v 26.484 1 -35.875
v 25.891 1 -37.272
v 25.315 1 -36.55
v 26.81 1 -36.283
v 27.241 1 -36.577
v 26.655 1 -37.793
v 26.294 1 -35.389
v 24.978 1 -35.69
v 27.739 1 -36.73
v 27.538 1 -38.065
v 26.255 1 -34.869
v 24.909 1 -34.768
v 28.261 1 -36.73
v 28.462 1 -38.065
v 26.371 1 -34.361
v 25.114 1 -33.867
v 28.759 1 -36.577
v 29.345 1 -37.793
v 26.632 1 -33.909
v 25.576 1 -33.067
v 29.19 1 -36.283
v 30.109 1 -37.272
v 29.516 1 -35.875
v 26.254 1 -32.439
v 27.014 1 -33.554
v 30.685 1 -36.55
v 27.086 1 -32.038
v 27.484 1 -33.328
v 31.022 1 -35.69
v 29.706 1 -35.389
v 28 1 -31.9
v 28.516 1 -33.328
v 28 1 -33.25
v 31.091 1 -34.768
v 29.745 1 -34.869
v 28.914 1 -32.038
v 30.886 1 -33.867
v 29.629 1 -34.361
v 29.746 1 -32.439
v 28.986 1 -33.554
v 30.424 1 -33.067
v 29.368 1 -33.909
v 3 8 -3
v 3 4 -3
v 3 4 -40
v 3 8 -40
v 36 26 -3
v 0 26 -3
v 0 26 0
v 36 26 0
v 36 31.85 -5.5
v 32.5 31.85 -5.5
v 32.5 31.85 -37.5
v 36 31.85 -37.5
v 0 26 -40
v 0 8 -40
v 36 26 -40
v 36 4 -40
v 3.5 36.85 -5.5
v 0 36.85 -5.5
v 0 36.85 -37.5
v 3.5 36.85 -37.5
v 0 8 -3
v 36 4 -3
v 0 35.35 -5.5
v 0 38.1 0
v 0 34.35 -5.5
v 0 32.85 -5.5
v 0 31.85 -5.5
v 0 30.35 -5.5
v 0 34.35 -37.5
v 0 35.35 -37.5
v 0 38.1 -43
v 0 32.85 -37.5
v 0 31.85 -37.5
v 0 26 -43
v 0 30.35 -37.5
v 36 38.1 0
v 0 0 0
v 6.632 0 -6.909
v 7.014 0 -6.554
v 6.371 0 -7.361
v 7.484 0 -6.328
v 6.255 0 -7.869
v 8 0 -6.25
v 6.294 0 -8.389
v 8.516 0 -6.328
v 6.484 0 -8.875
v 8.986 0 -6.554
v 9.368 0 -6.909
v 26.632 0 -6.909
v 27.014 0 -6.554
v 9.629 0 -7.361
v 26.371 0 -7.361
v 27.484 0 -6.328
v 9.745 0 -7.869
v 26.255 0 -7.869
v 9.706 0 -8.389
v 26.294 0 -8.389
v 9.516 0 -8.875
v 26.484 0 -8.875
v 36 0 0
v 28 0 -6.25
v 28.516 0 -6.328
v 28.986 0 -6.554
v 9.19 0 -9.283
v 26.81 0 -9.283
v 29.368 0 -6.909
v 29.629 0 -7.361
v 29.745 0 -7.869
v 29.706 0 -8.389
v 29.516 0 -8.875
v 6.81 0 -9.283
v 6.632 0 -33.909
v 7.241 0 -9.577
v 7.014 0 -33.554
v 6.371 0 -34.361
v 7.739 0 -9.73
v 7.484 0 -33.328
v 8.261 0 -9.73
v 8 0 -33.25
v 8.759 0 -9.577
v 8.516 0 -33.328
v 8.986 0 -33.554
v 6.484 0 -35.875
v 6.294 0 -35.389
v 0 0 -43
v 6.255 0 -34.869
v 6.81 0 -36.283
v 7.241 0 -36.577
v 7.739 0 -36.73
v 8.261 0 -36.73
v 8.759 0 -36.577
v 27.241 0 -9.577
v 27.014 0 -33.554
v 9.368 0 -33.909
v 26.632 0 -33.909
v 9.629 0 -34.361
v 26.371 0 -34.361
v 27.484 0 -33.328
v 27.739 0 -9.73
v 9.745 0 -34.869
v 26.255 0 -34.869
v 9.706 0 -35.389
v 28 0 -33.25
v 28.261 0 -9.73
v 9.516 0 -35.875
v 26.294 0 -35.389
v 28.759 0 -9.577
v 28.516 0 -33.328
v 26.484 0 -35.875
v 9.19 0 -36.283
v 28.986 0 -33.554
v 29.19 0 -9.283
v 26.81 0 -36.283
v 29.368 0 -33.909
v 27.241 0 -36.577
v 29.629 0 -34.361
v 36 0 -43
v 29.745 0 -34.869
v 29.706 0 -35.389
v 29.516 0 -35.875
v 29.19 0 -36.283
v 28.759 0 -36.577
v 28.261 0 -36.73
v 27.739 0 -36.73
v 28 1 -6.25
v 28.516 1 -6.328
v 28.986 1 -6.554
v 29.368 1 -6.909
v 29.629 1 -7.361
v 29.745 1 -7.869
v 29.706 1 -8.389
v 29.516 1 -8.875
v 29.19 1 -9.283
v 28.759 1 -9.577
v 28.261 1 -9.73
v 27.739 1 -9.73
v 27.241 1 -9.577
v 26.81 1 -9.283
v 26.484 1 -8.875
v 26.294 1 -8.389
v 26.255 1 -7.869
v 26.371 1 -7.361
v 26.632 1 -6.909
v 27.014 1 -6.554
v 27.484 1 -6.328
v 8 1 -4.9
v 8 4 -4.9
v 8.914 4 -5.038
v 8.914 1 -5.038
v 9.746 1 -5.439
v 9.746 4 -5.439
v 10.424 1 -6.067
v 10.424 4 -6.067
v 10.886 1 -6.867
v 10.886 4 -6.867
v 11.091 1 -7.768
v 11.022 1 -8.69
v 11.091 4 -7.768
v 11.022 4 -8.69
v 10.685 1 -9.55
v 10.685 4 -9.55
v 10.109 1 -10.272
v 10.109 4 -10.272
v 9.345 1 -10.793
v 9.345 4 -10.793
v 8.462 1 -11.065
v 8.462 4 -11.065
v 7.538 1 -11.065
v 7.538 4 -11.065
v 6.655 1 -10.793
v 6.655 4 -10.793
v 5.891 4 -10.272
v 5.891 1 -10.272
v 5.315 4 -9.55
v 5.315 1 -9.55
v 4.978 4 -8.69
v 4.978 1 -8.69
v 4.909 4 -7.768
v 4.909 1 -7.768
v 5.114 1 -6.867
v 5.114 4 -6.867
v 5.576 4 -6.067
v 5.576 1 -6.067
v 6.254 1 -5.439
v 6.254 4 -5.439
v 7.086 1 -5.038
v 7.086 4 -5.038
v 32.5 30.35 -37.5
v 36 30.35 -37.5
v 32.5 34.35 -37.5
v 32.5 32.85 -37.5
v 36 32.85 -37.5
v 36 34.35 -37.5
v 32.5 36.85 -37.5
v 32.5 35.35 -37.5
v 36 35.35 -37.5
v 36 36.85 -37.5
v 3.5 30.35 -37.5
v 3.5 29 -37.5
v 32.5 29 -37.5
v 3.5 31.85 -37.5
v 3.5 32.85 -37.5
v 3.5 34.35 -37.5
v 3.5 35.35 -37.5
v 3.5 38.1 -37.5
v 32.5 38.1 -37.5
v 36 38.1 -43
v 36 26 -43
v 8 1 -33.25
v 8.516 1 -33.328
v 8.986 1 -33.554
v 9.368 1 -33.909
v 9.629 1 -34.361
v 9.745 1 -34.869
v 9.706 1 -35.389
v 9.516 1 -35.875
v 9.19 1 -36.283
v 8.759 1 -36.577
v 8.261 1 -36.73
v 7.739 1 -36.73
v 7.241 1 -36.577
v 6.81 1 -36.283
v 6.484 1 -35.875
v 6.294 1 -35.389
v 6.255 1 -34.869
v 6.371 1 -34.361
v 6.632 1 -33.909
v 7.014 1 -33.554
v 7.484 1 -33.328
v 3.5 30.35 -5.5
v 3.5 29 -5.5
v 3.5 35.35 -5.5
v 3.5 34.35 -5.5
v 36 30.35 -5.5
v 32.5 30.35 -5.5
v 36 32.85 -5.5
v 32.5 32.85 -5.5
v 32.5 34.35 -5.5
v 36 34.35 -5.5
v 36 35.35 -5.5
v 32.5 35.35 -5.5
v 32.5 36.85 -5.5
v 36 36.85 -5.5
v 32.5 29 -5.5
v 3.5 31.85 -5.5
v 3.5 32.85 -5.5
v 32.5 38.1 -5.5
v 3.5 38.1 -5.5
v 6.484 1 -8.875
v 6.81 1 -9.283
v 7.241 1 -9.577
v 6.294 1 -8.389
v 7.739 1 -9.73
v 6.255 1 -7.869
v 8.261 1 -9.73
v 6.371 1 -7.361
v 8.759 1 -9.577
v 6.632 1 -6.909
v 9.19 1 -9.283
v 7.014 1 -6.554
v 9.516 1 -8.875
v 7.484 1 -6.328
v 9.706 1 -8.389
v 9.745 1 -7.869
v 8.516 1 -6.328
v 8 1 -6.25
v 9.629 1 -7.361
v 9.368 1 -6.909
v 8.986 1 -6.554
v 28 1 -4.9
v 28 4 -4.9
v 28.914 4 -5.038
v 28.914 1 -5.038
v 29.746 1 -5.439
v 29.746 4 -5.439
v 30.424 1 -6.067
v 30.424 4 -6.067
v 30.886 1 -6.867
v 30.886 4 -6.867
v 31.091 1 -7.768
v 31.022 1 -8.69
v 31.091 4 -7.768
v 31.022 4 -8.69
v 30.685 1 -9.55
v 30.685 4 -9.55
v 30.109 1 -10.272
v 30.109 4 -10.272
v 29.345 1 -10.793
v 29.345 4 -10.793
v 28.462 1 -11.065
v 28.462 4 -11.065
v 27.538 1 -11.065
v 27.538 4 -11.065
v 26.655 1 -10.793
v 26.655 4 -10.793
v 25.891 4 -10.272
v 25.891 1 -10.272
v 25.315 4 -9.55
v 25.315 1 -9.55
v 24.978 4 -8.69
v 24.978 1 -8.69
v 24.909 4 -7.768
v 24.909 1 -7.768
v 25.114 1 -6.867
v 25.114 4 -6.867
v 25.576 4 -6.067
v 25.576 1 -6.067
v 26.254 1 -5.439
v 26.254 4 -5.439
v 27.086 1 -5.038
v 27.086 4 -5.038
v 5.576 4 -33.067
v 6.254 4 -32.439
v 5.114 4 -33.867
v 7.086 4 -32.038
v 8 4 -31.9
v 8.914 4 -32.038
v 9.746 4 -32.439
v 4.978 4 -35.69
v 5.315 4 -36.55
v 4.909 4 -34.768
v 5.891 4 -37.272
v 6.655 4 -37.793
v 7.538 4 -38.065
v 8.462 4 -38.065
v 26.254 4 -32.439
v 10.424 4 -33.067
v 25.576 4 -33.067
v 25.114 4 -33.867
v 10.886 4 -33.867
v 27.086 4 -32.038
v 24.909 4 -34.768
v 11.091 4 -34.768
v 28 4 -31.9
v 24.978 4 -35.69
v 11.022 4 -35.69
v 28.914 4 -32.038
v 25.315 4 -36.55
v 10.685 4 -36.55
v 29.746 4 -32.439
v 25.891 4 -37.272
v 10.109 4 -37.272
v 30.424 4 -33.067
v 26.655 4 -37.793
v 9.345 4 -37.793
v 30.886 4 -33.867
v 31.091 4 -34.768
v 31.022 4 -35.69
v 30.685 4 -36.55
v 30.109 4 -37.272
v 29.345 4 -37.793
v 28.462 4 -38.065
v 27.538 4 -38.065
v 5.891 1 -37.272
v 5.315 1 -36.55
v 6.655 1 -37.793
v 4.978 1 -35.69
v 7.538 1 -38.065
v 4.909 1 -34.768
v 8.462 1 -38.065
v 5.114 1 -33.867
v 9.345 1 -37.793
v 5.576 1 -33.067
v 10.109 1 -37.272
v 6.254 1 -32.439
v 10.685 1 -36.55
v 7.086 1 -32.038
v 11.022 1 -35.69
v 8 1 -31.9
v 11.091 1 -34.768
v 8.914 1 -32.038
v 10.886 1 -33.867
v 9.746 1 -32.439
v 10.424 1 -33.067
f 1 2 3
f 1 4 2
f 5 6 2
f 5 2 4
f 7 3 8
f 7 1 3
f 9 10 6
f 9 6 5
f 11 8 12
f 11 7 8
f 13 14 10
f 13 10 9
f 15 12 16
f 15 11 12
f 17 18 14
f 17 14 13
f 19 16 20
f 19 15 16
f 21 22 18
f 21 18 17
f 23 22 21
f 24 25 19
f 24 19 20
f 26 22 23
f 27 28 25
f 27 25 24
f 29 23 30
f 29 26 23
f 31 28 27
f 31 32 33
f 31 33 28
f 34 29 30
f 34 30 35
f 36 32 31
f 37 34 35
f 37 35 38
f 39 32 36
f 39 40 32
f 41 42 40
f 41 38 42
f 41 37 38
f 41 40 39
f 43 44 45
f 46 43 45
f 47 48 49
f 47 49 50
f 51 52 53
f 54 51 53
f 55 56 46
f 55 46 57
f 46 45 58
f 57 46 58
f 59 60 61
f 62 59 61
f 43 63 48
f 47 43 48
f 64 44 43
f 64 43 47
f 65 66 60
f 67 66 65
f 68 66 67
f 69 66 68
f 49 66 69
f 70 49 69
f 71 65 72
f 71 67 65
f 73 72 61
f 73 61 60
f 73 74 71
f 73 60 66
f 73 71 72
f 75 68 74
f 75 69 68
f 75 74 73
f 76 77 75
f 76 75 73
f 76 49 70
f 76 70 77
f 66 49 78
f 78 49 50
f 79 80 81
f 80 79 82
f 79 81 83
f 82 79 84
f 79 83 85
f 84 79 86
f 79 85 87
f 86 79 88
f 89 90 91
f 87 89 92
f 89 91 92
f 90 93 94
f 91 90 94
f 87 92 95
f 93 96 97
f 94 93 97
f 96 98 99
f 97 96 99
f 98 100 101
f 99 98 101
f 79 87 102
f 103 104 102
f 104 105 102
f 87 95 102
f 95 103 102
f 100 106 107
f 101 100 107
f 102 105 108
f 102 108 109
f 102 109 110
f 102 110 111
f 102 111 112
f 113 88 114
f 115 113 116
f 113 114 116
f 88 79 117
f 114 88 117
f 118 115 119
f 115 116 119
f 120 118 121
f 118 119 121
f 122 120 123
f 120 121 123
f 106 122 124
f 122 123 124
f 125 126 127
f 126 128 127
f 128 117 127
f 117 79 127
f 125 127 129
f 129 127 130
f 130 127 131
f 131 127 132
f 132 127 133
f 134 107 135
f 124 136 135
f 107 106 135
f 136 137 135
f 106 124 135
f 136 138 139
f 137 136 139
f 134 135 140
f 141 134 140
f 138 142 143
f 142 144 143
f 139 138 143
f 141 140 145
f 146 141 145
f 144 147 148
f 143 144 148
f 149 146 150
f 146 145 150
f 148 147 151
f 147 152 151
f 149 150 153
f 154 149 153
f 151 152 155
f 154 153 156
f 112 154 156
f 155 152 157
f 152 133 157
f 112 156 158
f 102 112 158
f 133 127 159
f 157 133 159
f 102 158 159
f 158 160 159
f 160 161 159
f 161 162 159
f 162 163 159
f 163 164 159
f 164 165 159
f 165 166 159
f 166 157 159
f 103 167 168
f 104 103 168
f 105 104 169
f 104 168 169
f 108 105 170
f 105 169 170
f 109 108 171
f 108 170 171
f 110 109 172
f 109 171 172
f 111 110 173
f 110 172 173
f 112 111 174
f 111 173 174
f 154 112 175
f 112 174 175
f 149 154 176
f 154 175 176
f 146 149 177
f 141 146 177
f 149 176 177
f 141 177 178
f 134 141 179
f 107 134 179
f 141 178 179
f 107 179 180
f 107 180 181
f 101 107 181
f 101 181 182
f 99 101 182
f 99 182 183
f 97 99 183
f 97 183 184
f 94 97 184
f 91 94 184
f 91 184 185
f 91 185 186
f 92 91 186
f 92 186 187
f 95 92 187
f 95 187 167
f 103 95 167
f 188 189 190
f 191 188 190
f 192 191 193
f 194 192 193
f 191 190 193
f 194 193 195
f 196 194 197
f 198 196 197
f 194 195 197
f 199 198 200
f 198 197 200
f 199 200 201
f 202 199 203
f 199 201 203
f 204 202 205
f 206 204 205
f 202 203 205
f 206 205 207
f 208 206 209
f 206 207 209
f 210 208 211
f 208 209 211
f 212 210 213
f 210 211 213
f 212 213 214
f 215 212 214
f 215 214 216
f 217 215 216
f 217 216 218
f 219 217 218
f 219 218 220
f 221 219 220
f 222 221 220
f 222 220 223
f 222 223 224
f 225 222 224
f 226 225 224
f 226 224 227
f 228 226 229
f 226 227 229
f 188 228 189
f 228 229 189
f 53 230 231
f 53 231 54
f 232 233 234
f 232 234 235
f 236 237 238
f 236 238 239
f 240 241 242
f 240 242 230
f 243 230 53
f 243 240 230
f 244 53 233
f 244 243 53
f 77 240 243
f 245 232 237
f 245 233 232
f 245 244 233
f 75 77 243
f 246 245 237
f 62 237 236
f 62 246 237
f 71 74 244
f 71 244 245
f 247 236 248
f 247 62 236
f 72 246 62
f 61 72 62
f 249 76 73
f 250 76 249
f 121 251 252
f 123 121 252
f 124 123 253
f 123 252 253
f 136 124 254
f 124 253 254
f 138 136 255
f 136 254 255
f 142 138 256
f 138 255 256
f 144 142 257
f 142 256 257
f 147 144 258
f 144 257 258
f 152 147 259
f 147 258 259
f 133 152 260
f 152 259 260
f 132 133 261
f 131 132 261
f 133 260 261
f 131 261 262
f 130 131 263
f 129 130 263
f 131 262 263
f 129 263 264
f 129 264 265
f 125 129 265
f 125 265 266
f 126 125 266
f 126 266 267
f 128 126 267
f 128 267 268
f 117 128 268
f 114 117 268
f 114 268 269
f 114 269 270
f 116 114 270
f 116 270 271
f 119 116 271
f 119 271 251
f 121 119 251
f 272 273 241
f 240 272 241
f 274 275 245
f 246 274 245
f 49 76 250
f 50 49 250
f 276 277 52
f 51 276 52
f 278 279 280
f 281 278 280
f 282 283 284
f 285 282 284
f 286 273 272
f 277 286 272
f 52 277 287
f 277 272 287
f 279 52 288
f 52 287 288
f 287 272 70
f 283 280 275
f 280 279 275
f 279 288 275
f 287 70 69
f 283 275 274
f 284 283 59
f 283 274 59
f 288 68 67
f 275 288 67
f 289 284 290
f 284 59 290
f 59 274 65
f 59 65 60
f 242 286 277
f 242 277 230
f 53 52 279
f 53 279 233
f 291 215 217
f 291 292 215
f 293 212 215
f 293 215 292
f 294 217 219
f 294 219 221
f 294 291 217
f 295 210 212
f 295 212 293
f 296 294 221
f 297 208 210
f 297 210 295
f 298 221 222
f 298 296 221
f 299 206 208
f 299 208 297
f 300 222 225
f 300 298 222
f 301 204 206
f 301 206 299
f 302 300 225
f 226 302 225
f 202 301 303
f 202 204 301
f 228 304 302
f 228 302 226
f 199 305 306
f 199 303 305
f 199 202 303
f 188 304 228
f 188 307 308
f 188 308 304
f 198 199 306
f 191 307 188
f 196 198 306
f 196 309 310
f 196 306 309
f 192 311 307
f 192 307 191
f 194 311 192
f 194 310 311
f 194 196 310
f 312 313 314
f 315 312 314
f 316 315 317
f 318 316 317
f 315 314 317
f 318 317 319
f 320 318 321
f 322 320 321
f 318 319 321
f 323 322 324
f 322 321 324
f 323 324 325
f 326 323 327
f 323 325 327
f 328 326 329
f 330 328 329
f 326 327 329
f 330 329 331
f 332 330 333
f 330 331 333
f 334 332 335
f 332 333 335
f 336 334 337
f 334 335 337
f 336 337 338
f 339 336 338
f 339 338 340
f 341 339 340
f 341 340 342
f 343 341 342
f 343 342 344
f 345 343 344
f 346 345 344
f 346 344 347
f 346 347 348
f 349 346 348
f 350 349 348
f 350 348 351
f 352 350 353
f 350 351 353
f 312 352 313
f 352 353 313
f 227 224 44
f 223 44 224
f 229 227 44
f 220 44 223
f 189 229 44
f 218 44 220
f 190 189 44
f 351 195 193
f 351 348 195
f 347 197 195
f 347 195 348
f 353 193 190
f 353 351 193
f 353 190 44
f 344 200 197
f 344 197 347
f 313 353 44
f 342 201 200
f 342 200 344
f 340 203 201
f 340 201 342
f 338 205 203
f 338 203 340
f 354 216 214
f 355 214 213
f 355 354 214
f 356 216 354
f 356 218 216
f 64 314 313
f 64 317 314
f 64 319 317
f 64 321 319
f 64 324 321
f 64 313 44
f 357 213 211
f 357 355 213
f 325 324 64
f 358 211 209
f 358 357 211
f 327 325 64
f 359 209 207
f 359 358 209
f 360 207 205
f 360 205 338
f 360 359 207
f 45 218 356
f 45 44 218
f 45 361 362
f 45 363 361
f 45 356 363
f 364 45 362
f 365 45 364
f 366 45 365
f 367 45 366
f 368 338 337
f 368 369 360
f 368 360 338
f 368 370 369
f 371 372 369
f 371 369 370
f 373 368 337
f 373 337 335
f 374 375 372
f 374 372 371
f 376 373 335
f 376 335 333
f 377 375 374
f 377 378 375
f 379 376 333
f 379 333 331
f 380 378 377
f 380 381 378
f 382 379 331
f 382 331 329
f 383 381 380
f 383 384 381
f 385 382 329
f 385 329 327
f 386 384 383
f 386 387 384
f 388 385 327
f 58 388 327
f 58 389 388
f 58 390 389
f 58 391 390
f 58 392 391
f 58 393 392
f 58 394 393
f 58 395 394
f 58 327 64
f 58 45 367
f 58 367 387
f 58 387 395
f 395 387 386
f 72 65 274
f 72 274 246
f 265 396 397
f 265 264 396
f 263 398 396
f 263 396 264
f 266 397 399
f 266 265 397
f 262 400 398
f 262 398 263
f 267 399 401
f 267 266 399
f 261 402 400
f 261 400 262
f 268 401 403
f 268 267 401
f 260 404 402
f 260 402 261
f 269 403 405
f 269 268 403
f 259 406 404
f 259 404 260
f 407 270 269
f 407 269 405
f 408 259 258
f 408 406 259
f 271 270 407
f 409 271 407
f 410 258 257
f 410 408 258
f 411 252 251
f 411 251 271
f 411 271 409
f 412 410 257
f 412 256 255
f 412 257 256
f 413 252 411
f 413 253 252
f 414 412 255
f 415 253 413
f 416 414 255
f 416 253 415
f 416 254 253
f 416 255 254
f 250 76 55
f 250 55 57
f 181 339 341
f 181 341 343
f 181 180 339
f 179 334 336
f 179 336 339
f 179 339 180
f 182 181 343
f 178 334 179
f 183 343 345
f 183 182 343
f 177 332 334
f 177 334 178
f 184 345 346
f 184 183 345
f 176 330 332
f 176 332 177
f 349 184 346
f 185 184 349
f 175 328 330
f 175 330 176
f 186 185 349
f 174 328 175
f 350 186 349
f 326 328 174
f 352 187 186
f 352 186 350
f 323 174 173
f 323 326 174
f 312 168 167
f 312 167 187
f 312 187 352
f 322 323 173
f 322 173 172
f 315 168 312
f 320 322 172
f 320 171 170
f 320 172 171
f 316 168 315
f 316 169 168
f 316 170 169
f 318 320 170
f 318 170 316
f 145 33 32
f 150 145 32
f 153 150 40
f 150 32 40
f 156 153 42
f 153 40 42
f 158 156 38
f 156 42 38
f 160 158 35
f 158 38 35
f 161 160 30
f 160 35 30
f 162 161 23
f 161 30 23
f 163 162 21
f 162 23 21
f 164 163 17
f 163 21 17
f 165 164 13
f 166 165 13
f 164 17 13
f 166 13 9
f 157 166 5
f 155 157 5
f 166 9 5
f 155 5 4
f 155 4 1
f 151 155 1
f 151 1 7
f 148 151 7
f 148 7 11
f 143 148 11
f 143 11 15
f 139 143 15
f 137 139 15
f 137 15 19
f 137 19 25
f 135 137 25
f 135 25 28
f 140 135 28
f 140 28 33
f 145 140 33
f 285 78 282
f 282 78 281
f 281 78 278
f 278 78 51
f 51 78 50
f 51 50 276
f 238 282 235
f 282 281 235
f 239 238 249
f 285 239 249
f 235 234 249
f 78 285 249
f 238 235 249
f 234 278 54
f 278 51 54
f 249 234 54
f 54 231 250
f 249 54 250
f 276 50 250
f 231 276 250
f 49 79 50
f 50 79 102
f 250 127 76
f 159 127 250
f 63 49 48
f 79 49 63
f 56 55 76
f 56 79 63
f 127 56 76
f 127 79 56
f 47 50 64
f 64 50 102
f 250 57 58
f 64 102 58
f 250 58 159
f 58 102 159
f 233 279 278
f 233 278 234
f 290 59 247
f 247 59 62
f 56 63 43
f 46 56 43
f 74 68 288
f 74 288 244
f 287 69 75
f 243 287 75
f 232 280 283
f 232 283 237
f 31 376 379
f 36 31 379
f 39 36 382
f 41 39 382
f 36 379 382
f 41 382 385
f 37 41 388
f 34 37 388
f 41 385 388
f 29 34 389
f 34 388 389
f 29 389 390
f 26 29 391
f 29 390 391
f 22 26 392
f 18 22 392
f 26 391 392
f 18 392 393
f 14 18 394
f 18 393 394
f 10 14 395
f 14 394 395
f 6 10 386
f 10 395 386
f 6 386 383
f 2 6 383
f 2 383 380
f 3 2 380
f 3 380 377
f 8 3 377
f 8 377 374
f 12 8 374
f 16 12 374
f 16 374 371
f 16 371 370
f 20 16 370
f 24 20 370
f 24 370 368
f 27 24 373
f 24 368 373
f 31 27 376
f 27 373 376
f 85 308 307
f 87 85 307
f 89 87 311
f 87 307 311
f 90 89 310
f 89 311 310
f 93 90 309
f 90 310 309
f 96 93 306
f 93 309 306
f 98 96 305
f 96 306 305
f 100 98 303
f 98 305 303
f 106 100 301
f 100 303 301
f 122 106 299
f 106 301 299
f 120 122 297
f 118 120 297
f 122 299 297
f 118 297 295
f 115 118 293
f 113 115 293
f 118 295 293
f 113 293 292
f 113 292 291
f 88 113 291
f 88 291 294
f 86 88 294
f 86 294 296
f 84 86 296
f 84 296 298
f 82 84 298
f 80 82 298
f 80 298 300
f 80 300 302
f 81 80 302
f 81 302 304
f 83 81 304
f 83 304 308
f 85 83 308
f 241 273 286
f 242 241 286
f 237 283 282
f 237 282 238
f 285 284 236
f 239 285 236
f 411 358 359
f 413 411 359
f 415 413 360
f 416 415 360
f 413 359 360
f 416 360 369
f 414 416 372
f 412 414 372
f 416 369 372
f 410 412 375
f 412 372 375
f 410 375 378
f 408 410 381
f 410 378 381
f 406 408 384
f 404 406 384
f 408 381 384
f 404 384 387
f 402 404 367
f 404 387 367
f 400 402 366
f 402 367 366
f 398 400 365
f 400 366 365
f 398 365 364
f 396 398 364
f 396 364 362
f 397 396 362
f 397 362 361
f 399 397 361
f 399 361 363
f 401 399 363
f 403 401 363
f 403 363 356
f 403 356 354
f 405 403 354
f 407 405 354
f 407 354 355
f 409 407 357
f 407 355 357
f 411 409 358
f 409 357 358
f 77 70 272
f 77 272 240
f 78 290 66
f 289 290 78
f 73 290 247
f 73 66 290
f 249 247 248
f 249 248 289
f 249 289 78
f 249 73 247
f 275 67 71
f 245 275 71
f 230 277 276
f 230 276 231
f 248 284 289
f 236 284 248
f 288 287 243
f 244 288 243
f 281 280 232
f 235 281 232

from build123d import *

# Parameters (mm, degrees)
CROQUIS1_W                 = 36
CROQUIS1_H                 = 43
SALIENTE_EXTRUIR4_DEPTH    = 4
CROQUIS6_W                 = 36
CROQUIS6_H                 = 3
SALIENTE_EXTRUIR5_DEPTH    = 22
CROQUIS7_W                 = 36
CROQUIS7_H                 = 43
SALIENTE_EXTRUIR6_DEPTH    = 3
CROQUIS8_W                 = 3
CROQUIS8_H                 = 43
SALIENTE_EXTRUIR7_DEPTH    = 4
CROQUIS9_W                 = 36
CROQUIS9_H                 = 43
CROQUIS9_W_2               = 29
CROQUIS9_H_2               = 32
SALIENTE_EXTRUIR8_DEPTH    = 9.1
CORTAR_EXTRUIR1_DEPTH      = 67.00651483
CORTAR_EXTRUIR1_DEPTH_BACK = 67.00651483
CROQUIS10_W                = 32
CROQUIS10_H                = 1.5
CROQUIS12_R                = 1.75
CORTAR_EXTRUIR2_DEPTH      = 66.633908919
CROQUIS13_R                = 3.1
CORTAR_EXTRUIR3_DEPTH      = 3


# Read off the part's stored shape, not the designer's step: Partir1
with BuildPart() as part:
    # Croquis1 → Saliente-Extruir4 (new body)
    with BuildSketch(Plane(origin=(0, 0, 0), x_dir=(1, 0, 0), z_dir=(0, 1, 0))):
        with Locations((18, 21.5)):
            Rectangle(CROQUIS1_W, CROQUIS1_H)
    extrude(amount=SALIENTE_EXTRUIR4_DEPTH)

    # Croquis6 → Saliente-Extruir5 (add)
    with BuildSketch(Plane(origin=(0, 4, 0), x_dir=(1, 0, 0), z_dir=(0, 1, 0))):
        with Locations((18, 41.5)):
            Rectangle(CROQUIS6_W, CROQUIS6_H)
        with Locations((18, 1.5)):
            Rectangle(CROQUIS6_W, CROQUIS6_H)
    extrude(amount=SALIENTE_EXTRUIR5_DEPTH)

    # Croquis7 → Saliente-Extruir6 (add)
    with BuildSketch(Plane(origin=(0, 26, 0), x_dir=(1, 0, 0), z_dir=(0, 1, 0))):
        with Locations((18, 21.5)):
            Rectangle(CROQUIS7_W, CROQUIS7_H)
    extrude(amount=SALIENTE_EXTRUIR6_DEPTH)

    # Croquis8 → Saliente-Extruir7 (add)
    with BuildSketch(Plane(origin=(0, 4, 0), x_dir=(1, 0, 0), z_dir=(0, 1, 0))):
        with Locations((1.5, 21.5)):
            Rectangle(CROQUIS8_W, CROQUIS8_H)
    extrude(amount=SALIENTE_EXTRUIR7_DEPTH)

    # Croquis9 → Saliente-Extruir8 (add)
    with BuildSketch(Plane(origin=(0, 29, 0), x_dir=(1, 0, 0), z_dir=(0, 1, 0))):
        with Locations((18, 21.5)):
            Rectangle(CROQUIS9_W, CROQUIS9_H)
        with Locations((18, 21.5)):
            Rectangle(CROQUIS9_W_2, CROQUIS9_H_2, mode=Mode.SUBTRACT)
    extrude(amount=SALIENTE_EXTRUIR8_DEPTH)

    # Croquis10 → Cortar-Extruir1 (cut, two sides: drawn at the far end of the back side and taken through both)
    with BuildSketch(Plane(origin=(3.5, 0, 0), x_dir=(0, 0, -1), z_dir=(1, 0, 0)).offset(-CORTAR_EXTRUIR1_DEPTH_BACK)):
        with Locations((21.5, 36.1)):
            Rectangle(CROQUIS10_W, CROQUIS10_H)
        with Locations((21.5, 33.6)):
            Rectangle(CROQUIS10_W, CROQUIS10_H)
        with Locations((21.5, 31.1)):
            Rectangle(CROQUIS10_W, CROQUIS10_H)
    extrude(amount=CORTAR_EXTRUIR1_DEPTH + CORTAR_EXTRUIR1_DEPTH_BACK, mode=Mode.SUBTRACT)

    # Croquis12 → Cortar-Extruir2 (cut, through all)
    with BuildSketch(Plane(origin=(0, 4, 0), x_dir=(1, 0, 0), z_dir=(0, 1, 0))):
        with Locations(Location((8, 35, 0), (0, 0, 270))):
            Circle(CROQUIS12_R)
        with Locations(Location((28, 35, 0), (0, 0, 270))):
            Circle(CROQUIS12_R)
        with Locations(Location((8, 8, 0), (0, 0, 270))):
            Circle(CROQUIS12_R)
        with Locations(Location((28, 8, 0), (0, 0, 270))):
            Circle(CROQUIS12_R)
    extrude(amount=-CORTAR_EXTRUIR2_DEPTH, mode=Mode.SUBTRACT)

    # Croquis13 → Cortar-Extruir3 (cut)
    with BuildSketch(Plane(origin=(0, 4, 0), x_dir=(1, 0, 0), z_dir=(0, 1, 0))):
        with Locations(Location((8, 35, 0), (0, 0, 270))):
            Circle(CROQUIS13_R)
        with Locations(Location((28, 35, 0), (0, 0, 270))):
            Circle(CROQUIS13_R)
        with Locations(Location((28, 8, 0), (0, 0, 270))):
            Circle(CROQUIS13_R)
        with Locations(Location((8, 8, 0), (0, 0, 270))):
            Circle(CROQUIS13_R)
    extrude(amount=-CORTAR_EXTRUIR3_DEPTH, mode=Mode.SUBTRACT)


with BuildPart() as body_2:
    # Partir1: the piece on the far side of the plane
    add(part.part)
    split(bisect_by=Plane(origin=(0, 26, 0), x_dir=(1, 0, 0), z_dir=(0, 1, 0)), keep=Keep.BOTTOM)


with BuildPart() as part_1:
    add(part.part)

    # Partir1
    split(bisect_by=Plane(origin=(0, 26, 0), x_dir=(1, 0, 0), z_dir=(0, 1, 0)), keep=Keep.TOP)


solid = Compound([body_2.part, part_1.part])
